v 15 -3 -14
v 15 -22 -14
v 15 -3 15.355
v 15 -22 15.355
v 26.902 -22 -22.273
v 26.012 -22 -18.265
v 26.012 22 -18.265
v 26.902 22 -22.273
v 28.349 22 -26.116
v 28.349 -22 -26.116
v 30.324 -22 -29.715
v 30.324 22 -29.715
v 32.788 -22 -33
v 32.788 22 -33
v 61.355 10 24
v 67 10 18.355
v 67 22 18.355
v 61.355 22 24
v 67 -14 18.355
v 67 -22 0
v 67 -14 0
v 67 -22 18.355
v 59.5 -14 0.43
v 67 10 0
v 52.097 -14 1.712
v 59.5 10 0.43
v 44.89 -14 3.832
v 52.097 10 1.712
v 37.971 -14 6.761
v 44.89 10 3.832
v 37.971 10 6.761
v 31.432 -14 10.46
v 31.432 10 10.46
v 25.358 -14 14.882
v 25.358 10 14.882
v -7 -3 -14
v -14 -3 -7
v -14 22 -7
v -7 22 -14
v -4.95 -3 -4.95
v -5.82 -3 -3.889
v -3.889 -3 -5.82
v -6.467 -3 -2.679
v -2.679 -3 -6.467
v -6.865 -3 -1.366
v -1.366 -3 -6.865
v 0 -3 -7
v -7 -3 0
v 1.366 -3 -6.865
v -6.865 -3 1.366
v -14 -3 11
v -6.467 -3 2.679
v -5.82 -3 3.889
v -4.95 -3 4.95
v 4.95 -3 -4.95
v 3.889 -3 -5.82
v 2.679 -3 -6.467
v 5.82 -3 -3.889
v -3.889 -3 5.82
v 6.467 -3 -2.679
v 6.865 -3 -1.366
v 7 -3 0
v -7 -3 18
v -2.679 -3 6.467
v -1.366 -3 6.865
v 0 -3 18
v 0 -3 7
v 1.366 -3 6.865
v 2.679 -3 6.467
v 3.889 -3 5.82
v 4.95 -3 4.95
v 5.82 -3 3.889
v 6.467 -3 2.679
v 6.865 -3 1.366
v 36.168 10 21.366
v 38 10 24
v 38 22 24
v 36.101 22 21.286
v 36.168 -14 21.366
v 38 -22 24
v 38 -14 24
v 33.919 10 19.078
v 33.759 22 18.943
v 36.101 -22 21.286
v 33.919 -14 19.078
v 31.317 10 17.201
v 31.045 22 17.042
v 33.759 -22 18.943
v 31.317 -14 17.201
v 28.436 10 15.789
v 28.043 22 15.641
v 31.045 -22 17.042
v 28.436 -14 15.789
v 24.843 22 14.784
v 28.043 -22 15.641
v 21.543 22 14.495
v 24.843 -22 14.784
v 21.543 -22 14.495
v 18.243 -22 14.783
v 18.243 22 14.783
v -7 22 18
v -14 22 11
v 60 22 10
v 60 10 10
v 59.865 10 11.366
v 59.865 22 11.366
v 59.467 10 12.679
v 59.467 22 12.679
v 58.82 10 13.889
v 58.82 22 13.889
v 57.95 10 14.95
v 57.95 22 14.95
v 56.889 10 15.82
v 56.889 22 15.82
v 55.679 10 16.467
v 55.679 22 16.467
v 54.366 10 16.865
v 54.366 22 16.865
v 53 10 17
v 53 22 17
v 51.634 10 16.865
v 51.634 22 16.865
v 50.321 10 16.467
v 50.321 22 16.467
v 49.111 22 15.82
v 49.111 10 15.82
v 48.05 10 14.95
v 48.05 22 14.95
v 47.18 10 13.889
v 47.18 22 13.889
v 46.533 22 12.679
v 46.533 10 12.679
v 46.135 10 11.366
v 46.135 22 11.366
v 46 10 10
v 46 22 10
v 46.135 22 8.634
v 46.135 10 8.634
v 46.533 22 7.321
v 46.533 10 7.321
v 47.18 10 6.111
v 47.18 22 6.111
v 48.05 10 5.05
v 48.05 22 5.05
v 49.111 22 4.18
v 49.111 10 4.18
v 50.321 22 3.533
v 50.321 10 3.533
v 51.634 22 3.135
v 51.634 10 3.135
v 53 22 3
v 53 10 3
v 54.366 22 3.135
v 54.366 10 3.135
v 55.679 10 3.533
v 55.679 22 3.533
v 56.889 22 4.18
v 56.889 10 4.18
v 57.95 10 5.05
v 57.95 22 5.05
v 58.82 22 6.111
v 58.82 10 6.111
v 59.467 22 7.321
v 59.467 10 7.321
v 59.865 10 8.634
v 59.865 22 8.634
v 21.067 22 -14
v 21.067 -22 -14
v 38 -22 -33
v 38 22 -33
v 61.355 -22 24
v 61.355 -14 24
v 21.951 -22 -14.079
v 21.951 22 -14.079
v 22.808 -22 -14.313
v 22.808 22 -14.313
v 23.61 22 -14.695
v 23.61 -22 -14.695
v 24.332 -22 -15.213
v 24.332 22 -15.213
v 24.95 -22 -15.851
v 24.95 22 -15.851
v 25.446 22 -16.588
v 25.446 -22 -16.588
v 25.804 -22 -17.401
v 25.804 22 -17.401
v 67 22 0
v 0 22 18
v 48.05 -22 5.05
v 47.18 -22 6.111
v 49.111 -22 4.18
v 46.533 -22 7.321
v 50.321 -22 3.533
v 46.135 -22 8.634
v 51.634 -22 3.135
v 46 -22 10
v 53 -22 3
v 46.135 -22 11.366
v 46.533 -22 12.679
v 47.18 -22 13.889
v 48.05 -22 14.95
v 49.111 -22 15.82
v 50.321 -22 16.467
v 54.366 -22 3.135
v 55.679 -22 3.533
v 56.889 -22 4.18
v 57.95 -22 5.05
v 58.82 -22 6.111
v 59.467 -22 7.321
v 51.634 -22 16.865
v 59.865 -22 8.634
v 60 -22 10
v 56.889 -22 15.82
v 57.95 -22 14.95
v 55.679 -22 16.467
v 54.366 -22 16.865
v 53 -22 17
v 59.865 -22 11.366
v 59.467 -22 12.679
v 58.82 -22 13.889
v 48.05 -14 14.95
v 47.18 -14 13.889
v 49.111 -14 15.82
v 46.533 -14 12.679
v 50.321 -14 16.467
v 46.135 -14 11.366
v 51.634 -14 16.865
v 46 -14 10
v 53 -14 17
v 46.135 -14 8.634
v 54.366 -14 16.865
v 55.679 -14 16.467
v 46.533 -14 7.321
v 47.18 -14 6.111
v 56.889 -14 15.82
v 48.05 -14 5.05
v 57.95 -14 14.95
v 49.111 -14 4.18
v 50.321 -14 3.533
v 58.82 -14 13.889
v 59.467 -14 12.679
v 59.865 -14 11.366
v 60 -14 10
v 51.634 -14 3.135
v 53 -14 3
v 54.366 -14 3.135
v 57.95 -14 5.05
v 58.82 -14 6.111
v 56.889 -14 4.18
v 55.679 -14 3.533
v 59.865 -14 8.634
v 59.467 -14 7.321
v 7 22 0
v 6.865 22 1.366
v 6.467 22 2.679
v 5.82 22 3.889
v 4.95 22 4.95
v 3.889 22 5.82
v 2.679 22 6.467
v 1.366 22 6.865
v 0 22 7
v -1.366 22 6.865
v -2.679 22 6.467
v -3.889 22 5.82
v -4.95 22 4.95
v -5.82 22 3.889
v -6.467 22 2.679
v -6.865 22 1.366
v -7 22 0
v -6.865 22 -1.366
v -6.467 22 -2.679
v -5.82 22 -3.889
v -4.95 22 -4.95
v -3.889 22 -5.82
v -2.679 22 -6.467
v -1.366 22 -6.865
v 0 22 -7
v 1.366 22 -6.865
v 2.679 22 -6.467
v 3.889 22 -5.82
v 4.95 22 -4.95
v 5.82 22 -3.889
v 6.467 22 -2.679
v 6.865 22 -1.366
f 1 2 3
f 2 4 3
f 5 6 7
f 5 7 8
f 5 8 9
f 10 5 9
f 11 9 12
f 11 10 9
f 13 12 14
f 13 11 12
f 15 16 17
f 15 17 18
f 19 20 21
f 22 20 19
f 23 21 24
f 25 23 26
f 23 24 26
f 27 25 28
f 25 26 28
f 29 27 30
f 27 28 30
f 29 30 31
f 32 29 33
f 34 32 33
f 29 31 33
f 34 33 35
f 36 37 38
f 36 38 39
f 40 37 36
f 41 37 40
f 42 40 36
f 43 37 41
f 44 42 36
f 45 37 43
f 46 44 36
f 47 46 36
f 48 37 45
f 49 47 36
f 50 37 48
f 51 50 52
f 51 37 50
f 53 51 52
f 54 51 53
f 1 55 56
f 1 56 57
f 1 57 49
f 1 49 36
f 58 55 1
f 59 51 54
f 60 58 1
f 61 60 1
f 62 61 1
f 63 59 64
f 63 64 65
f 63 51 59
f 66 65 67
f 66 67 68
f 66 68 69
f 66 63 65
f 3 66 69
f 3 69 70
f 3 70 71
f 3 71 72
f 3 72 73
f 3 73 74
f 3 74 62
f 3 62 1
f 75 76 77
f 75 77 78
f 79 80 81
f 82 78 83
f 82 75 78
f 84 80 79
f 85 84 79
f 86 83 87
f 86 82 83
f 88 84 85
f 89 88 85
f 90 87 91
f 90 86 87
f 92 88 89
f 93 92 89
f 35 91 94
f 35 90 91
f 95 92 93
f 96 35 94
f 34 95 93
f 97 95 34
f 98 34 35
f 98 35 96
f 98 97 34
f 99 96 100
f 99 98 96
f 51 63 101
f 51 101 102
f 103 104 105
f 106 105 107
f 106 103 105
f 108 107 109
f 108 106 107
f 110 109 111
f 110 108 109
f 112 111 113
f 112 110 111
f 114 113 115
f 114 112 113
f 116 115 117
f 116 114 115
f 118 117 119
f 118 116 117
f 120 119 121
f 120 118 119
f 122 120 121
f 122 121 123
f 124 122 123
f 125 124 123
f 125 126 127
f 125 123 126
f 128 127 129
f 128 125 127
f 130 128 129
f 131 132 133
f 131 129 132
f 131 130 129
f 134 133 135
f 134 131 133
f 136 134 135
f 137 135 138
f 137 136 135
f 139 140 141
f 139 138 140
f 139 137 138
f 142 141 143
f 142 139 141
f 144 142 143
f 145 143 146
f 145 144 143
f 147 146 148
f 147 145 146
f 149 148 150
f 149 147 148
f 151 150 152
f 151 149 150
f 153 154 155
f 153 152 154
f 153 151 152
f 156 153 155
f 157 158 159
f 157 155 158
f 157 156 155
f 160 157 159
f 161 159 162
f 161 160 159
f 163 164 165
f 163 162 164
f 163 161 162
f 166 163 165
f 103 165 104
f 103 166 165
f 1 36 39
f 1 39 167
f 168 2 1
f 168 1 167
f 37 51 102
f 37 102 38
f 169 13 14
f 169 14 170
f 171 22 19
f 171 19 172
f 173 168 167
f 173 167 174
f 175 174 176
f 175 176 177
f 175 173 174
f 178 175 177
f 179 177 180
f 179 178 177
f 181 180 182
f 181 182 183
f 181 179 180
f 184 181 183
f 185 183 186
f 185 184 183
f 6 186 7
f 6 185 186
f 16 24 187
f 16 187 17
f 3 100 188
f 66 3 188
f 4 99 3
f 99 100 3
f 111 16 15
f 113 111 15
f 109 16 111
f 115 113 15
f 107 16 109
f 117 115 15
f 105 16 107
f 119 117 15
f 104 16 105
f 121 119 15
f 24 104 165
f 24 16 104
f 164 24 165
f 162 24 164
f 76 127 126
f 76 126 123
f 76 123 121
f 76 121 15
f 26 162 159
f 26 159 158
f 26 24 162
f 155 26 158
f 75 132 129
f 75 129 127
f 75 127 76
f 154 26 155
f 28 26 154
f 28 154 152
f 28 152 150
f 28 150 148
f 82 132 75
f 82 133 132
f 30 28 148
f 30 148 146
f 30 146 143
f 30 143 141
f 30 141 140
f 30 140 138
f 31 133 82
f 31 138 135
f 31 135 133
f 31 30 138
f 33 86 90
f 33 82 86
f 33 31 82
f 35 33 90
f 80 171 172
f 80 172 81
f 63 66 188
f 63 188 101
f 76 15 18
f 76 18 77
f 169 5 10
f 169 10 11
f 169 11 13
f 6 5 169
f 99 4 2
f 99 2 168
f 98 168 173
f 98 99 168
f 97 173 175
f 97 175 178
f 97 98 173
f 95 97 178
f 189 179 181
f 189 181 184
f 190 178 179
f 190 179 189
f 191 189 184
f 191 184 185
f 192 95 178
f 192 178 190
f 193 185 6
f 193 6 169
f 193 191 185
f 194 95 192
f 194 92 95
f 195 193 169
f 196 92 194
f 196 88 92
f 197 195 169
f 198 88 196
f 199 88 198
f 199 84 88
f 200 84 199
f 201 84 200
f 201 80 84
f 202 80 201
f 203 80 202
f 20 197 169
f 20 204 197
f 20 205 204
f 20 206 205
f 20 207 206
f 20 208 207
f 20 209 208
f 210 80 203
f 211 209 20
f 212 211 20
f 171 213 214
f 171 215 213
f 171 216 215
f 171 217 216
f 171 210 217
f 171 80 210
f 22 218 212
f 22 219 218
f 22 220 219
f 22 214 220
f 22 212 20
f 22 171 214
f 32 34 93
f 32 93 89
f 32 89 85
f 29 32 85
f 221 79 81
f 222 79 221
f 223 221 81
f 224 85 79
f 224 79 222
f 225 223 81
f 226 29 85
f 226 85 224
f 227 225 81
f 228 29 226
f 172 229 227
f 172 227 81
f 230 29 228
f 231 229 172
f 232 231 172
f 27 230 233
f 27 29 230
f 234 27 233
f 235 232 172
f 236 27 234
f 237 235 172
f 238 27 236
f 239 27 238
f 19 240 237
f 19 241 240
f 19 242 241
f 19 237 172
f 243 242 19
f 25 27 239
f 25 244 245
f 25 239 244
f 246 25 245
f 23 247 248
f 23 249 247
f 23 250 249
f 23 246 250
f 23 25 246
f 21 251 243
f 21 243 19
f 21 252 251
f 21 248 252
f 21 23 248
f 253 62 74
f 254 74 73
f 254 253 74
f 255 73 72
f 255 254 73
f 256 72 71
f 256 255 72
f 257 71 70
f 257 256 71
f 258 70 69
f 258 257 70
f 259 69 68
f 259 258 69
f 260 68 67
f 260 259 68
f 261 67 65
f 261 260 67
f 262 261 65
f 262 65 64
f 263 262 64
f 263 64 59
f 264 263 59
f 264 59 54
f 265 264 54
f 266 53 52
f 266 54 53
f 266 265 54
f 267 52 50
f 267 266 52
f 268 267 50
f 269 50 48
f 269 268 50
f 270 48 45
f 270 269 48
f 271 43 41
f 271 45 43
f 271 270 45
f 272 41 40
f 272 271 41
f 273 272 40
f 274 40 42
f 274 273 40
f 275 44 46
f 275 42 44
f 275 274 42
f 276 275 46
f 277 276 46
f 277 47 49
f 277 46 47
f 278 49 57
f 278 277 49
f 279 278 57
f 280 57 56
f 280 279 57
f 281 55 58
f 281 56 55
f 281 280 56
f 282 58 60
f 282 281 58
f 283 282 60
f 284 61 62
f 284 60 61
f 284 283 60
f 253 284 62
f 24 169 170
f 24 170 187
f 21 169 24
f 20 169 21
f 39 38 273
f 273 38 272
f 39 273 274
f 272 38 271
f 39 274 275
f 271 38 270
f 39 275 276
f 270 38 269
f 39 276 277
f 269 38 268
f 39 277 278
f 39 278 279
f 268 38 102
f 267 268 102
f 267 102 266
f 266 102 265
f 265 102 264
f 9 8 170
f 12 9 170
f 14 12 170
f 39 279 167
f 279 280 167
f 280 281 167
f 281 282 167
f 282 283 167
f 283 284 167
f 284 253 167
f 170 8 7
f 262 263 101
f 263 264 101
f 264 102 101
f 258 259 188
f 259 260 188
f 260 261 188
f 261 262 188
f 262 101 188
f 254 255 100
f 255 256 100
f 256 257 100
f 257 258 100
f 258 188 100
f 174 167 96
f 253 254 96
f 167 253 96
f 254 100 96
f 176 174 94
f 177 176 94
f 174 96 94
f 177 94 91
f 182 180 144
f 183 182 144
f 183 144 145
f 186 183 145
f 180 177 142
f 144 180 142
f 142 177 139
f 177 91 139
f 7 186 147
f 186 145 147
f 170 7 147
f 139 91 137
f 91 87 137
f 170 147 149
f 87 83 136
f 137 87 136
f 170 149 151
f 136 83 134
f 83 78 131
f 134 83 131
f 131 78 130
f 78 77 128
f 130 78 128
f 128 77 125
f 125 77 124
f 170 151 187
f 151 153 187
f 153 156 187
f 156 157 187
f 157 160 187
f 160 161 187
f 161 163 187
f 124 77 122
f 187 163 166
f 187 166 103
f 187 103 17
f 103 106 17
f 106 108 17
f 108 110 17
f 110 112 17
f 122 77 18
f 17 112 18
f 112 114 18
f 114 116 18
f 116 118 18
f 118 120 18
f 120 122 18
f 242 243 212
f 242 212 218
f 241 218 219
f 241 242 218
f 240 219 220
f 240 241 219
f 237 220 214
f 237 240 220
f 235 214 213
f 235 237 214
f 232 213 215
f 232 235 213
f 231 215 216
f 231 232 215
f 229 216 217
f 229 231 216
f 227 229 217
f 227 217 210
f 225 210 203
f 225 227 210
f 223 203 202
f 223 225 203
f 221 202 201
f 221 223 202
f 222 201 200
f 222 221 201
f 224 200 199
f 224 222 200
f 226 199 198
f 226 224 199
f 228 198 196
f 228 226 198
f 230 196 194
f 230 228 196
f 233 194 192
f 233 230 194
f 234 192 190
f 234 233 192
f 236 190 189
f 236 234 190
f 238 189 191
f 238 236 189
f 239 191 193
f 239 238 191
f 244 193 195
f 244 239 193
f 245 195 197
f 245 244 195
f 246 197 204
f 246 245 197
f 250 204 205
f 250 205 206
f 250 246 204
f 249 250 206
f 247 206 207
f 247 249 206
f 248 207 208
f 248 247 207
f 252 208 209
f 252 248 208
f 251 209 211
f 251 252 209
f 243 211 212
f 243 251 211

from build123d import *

# Parameters (mm, degrees)
F0_R        = 7
F1_DEPTH    = 22
F3_DEPTH    = 69.1
F4_T4_DEPTH = 24
F2_W        = 40.4194121808
F2_H        = 21.5930561535
F5_DEPTH    = 72.2


# Not quite as in the source:
# - a fillet or chamfer that OpenCascade refuses, or shapes differently, is made with other operations: its cross-section is extruded or revolved along the edge and cut away or added


with BuildPart() as f1:
    # F0 (on Front) → F1 (new body, symmetric)
    with BuildSketch(Plane.XZ):
        with BuildLine():
            Line((-7, 18), (-14, 11))
            Line((-14, 11), (-14, -7))
            Line((-14, -7), (-7, -14))
            Line((-7, -14), (21.0666262554, -14))
            ThreePointArc((21.0666262554, -14), (24.3318620364, -15.2134137678), (26.0122649968, -18.2647058824))
            ThreePointArc((26.0122649968, -18.2647058824), (28.3490951999, -26.115672061), (32.7880673968, -33))
            Line((32.7880673968, -33), (38, -33))
            Line((38, -33), (67, 0))
            Line((67, 0), (67, 18.3546076061))
            Line((67, 18.3546076061), (61.3546076061, 24))
            Line((61.3546076061, 24), (38, 24))
            ThreePointArc((38, 24), (29.5749729609, 16.2760691513), (18.2430849879, 14.7832519053))
            Line((18.2430849879, 14.7832519053), (0, 18))
            Line((0, 18), (-7, 18))
        make_face()
        Circle(F0_R, mode=Mode.SUBTRACT)
        with Locations((53, 10)):
            Circle(F0_R, mode=Mode.SUBTRACT)
    extrude(amount=F1_DEPTH, both=True)

    # F2 (on Top) → F3 (cut)
    with BuildSketch(Plane.XY):
        Polygon((90.3841100792, -14), (90.3841100792, 10), (25.3584354958, 10), (25.3584354958, -14), (86.1629769206, -14), align=None)
    extrude(amount=F3_DEPTH, mode=Mode.SUBTRACT)

    # F4: fillet of radius 65.7 on 1 edges, made by hand


with BuildPart() as f4_tool2:
    # F4_s3 → F4_t4 (new body)
    with BuildSketch(Plane.XZ.offset(-10)):
        with BuildLine():
            ThreePointArc((67, 0), (44.8895413168, 3.8321555148), (25.3584354958, 14.88175752))
            Line((25.3584354958, 14.88175752), (24.5256098882, 13.8653926704))
            ThreePointArc((24.5256098882, 13.8653926704), (24.0444354958, 7.44087876), (24.0444354958, 0))
            Line((24.0444354958, 0), (25.3584354958, -1.314))
            Line((25.3584354958, -1.314), (67.0000056826, -1.314))
            Line((67.0000056826, -1.314), (67, 0))
        make_face()
    extrude(amount=F4_T4_DEPTH)

    split(bisect_by=Plane(origin=(37.8046632124, 0, -33.2222797927), x_dir=(0, 1, 0), z_dir=(-0.7511648984, 0, 0.6601146077)), keep=Keep.TOP)


with BuildPart() as f1_1:
    add(f1.part)

    # F4_t1: union F4_tool2
    add(f4_tool2.part)

    # F2 (on Top) → F5 (cut, symmetric)
    with BuildSketch(Plane.XY):
        with Locations((-5.2097060904, -13.7965280768)):
            Rectangle(F2_W, F2_H)
    extrude(amount=F5_DEPTH, both=True, mode=Mode.SUBTRACT)


solid = f1_1.part
